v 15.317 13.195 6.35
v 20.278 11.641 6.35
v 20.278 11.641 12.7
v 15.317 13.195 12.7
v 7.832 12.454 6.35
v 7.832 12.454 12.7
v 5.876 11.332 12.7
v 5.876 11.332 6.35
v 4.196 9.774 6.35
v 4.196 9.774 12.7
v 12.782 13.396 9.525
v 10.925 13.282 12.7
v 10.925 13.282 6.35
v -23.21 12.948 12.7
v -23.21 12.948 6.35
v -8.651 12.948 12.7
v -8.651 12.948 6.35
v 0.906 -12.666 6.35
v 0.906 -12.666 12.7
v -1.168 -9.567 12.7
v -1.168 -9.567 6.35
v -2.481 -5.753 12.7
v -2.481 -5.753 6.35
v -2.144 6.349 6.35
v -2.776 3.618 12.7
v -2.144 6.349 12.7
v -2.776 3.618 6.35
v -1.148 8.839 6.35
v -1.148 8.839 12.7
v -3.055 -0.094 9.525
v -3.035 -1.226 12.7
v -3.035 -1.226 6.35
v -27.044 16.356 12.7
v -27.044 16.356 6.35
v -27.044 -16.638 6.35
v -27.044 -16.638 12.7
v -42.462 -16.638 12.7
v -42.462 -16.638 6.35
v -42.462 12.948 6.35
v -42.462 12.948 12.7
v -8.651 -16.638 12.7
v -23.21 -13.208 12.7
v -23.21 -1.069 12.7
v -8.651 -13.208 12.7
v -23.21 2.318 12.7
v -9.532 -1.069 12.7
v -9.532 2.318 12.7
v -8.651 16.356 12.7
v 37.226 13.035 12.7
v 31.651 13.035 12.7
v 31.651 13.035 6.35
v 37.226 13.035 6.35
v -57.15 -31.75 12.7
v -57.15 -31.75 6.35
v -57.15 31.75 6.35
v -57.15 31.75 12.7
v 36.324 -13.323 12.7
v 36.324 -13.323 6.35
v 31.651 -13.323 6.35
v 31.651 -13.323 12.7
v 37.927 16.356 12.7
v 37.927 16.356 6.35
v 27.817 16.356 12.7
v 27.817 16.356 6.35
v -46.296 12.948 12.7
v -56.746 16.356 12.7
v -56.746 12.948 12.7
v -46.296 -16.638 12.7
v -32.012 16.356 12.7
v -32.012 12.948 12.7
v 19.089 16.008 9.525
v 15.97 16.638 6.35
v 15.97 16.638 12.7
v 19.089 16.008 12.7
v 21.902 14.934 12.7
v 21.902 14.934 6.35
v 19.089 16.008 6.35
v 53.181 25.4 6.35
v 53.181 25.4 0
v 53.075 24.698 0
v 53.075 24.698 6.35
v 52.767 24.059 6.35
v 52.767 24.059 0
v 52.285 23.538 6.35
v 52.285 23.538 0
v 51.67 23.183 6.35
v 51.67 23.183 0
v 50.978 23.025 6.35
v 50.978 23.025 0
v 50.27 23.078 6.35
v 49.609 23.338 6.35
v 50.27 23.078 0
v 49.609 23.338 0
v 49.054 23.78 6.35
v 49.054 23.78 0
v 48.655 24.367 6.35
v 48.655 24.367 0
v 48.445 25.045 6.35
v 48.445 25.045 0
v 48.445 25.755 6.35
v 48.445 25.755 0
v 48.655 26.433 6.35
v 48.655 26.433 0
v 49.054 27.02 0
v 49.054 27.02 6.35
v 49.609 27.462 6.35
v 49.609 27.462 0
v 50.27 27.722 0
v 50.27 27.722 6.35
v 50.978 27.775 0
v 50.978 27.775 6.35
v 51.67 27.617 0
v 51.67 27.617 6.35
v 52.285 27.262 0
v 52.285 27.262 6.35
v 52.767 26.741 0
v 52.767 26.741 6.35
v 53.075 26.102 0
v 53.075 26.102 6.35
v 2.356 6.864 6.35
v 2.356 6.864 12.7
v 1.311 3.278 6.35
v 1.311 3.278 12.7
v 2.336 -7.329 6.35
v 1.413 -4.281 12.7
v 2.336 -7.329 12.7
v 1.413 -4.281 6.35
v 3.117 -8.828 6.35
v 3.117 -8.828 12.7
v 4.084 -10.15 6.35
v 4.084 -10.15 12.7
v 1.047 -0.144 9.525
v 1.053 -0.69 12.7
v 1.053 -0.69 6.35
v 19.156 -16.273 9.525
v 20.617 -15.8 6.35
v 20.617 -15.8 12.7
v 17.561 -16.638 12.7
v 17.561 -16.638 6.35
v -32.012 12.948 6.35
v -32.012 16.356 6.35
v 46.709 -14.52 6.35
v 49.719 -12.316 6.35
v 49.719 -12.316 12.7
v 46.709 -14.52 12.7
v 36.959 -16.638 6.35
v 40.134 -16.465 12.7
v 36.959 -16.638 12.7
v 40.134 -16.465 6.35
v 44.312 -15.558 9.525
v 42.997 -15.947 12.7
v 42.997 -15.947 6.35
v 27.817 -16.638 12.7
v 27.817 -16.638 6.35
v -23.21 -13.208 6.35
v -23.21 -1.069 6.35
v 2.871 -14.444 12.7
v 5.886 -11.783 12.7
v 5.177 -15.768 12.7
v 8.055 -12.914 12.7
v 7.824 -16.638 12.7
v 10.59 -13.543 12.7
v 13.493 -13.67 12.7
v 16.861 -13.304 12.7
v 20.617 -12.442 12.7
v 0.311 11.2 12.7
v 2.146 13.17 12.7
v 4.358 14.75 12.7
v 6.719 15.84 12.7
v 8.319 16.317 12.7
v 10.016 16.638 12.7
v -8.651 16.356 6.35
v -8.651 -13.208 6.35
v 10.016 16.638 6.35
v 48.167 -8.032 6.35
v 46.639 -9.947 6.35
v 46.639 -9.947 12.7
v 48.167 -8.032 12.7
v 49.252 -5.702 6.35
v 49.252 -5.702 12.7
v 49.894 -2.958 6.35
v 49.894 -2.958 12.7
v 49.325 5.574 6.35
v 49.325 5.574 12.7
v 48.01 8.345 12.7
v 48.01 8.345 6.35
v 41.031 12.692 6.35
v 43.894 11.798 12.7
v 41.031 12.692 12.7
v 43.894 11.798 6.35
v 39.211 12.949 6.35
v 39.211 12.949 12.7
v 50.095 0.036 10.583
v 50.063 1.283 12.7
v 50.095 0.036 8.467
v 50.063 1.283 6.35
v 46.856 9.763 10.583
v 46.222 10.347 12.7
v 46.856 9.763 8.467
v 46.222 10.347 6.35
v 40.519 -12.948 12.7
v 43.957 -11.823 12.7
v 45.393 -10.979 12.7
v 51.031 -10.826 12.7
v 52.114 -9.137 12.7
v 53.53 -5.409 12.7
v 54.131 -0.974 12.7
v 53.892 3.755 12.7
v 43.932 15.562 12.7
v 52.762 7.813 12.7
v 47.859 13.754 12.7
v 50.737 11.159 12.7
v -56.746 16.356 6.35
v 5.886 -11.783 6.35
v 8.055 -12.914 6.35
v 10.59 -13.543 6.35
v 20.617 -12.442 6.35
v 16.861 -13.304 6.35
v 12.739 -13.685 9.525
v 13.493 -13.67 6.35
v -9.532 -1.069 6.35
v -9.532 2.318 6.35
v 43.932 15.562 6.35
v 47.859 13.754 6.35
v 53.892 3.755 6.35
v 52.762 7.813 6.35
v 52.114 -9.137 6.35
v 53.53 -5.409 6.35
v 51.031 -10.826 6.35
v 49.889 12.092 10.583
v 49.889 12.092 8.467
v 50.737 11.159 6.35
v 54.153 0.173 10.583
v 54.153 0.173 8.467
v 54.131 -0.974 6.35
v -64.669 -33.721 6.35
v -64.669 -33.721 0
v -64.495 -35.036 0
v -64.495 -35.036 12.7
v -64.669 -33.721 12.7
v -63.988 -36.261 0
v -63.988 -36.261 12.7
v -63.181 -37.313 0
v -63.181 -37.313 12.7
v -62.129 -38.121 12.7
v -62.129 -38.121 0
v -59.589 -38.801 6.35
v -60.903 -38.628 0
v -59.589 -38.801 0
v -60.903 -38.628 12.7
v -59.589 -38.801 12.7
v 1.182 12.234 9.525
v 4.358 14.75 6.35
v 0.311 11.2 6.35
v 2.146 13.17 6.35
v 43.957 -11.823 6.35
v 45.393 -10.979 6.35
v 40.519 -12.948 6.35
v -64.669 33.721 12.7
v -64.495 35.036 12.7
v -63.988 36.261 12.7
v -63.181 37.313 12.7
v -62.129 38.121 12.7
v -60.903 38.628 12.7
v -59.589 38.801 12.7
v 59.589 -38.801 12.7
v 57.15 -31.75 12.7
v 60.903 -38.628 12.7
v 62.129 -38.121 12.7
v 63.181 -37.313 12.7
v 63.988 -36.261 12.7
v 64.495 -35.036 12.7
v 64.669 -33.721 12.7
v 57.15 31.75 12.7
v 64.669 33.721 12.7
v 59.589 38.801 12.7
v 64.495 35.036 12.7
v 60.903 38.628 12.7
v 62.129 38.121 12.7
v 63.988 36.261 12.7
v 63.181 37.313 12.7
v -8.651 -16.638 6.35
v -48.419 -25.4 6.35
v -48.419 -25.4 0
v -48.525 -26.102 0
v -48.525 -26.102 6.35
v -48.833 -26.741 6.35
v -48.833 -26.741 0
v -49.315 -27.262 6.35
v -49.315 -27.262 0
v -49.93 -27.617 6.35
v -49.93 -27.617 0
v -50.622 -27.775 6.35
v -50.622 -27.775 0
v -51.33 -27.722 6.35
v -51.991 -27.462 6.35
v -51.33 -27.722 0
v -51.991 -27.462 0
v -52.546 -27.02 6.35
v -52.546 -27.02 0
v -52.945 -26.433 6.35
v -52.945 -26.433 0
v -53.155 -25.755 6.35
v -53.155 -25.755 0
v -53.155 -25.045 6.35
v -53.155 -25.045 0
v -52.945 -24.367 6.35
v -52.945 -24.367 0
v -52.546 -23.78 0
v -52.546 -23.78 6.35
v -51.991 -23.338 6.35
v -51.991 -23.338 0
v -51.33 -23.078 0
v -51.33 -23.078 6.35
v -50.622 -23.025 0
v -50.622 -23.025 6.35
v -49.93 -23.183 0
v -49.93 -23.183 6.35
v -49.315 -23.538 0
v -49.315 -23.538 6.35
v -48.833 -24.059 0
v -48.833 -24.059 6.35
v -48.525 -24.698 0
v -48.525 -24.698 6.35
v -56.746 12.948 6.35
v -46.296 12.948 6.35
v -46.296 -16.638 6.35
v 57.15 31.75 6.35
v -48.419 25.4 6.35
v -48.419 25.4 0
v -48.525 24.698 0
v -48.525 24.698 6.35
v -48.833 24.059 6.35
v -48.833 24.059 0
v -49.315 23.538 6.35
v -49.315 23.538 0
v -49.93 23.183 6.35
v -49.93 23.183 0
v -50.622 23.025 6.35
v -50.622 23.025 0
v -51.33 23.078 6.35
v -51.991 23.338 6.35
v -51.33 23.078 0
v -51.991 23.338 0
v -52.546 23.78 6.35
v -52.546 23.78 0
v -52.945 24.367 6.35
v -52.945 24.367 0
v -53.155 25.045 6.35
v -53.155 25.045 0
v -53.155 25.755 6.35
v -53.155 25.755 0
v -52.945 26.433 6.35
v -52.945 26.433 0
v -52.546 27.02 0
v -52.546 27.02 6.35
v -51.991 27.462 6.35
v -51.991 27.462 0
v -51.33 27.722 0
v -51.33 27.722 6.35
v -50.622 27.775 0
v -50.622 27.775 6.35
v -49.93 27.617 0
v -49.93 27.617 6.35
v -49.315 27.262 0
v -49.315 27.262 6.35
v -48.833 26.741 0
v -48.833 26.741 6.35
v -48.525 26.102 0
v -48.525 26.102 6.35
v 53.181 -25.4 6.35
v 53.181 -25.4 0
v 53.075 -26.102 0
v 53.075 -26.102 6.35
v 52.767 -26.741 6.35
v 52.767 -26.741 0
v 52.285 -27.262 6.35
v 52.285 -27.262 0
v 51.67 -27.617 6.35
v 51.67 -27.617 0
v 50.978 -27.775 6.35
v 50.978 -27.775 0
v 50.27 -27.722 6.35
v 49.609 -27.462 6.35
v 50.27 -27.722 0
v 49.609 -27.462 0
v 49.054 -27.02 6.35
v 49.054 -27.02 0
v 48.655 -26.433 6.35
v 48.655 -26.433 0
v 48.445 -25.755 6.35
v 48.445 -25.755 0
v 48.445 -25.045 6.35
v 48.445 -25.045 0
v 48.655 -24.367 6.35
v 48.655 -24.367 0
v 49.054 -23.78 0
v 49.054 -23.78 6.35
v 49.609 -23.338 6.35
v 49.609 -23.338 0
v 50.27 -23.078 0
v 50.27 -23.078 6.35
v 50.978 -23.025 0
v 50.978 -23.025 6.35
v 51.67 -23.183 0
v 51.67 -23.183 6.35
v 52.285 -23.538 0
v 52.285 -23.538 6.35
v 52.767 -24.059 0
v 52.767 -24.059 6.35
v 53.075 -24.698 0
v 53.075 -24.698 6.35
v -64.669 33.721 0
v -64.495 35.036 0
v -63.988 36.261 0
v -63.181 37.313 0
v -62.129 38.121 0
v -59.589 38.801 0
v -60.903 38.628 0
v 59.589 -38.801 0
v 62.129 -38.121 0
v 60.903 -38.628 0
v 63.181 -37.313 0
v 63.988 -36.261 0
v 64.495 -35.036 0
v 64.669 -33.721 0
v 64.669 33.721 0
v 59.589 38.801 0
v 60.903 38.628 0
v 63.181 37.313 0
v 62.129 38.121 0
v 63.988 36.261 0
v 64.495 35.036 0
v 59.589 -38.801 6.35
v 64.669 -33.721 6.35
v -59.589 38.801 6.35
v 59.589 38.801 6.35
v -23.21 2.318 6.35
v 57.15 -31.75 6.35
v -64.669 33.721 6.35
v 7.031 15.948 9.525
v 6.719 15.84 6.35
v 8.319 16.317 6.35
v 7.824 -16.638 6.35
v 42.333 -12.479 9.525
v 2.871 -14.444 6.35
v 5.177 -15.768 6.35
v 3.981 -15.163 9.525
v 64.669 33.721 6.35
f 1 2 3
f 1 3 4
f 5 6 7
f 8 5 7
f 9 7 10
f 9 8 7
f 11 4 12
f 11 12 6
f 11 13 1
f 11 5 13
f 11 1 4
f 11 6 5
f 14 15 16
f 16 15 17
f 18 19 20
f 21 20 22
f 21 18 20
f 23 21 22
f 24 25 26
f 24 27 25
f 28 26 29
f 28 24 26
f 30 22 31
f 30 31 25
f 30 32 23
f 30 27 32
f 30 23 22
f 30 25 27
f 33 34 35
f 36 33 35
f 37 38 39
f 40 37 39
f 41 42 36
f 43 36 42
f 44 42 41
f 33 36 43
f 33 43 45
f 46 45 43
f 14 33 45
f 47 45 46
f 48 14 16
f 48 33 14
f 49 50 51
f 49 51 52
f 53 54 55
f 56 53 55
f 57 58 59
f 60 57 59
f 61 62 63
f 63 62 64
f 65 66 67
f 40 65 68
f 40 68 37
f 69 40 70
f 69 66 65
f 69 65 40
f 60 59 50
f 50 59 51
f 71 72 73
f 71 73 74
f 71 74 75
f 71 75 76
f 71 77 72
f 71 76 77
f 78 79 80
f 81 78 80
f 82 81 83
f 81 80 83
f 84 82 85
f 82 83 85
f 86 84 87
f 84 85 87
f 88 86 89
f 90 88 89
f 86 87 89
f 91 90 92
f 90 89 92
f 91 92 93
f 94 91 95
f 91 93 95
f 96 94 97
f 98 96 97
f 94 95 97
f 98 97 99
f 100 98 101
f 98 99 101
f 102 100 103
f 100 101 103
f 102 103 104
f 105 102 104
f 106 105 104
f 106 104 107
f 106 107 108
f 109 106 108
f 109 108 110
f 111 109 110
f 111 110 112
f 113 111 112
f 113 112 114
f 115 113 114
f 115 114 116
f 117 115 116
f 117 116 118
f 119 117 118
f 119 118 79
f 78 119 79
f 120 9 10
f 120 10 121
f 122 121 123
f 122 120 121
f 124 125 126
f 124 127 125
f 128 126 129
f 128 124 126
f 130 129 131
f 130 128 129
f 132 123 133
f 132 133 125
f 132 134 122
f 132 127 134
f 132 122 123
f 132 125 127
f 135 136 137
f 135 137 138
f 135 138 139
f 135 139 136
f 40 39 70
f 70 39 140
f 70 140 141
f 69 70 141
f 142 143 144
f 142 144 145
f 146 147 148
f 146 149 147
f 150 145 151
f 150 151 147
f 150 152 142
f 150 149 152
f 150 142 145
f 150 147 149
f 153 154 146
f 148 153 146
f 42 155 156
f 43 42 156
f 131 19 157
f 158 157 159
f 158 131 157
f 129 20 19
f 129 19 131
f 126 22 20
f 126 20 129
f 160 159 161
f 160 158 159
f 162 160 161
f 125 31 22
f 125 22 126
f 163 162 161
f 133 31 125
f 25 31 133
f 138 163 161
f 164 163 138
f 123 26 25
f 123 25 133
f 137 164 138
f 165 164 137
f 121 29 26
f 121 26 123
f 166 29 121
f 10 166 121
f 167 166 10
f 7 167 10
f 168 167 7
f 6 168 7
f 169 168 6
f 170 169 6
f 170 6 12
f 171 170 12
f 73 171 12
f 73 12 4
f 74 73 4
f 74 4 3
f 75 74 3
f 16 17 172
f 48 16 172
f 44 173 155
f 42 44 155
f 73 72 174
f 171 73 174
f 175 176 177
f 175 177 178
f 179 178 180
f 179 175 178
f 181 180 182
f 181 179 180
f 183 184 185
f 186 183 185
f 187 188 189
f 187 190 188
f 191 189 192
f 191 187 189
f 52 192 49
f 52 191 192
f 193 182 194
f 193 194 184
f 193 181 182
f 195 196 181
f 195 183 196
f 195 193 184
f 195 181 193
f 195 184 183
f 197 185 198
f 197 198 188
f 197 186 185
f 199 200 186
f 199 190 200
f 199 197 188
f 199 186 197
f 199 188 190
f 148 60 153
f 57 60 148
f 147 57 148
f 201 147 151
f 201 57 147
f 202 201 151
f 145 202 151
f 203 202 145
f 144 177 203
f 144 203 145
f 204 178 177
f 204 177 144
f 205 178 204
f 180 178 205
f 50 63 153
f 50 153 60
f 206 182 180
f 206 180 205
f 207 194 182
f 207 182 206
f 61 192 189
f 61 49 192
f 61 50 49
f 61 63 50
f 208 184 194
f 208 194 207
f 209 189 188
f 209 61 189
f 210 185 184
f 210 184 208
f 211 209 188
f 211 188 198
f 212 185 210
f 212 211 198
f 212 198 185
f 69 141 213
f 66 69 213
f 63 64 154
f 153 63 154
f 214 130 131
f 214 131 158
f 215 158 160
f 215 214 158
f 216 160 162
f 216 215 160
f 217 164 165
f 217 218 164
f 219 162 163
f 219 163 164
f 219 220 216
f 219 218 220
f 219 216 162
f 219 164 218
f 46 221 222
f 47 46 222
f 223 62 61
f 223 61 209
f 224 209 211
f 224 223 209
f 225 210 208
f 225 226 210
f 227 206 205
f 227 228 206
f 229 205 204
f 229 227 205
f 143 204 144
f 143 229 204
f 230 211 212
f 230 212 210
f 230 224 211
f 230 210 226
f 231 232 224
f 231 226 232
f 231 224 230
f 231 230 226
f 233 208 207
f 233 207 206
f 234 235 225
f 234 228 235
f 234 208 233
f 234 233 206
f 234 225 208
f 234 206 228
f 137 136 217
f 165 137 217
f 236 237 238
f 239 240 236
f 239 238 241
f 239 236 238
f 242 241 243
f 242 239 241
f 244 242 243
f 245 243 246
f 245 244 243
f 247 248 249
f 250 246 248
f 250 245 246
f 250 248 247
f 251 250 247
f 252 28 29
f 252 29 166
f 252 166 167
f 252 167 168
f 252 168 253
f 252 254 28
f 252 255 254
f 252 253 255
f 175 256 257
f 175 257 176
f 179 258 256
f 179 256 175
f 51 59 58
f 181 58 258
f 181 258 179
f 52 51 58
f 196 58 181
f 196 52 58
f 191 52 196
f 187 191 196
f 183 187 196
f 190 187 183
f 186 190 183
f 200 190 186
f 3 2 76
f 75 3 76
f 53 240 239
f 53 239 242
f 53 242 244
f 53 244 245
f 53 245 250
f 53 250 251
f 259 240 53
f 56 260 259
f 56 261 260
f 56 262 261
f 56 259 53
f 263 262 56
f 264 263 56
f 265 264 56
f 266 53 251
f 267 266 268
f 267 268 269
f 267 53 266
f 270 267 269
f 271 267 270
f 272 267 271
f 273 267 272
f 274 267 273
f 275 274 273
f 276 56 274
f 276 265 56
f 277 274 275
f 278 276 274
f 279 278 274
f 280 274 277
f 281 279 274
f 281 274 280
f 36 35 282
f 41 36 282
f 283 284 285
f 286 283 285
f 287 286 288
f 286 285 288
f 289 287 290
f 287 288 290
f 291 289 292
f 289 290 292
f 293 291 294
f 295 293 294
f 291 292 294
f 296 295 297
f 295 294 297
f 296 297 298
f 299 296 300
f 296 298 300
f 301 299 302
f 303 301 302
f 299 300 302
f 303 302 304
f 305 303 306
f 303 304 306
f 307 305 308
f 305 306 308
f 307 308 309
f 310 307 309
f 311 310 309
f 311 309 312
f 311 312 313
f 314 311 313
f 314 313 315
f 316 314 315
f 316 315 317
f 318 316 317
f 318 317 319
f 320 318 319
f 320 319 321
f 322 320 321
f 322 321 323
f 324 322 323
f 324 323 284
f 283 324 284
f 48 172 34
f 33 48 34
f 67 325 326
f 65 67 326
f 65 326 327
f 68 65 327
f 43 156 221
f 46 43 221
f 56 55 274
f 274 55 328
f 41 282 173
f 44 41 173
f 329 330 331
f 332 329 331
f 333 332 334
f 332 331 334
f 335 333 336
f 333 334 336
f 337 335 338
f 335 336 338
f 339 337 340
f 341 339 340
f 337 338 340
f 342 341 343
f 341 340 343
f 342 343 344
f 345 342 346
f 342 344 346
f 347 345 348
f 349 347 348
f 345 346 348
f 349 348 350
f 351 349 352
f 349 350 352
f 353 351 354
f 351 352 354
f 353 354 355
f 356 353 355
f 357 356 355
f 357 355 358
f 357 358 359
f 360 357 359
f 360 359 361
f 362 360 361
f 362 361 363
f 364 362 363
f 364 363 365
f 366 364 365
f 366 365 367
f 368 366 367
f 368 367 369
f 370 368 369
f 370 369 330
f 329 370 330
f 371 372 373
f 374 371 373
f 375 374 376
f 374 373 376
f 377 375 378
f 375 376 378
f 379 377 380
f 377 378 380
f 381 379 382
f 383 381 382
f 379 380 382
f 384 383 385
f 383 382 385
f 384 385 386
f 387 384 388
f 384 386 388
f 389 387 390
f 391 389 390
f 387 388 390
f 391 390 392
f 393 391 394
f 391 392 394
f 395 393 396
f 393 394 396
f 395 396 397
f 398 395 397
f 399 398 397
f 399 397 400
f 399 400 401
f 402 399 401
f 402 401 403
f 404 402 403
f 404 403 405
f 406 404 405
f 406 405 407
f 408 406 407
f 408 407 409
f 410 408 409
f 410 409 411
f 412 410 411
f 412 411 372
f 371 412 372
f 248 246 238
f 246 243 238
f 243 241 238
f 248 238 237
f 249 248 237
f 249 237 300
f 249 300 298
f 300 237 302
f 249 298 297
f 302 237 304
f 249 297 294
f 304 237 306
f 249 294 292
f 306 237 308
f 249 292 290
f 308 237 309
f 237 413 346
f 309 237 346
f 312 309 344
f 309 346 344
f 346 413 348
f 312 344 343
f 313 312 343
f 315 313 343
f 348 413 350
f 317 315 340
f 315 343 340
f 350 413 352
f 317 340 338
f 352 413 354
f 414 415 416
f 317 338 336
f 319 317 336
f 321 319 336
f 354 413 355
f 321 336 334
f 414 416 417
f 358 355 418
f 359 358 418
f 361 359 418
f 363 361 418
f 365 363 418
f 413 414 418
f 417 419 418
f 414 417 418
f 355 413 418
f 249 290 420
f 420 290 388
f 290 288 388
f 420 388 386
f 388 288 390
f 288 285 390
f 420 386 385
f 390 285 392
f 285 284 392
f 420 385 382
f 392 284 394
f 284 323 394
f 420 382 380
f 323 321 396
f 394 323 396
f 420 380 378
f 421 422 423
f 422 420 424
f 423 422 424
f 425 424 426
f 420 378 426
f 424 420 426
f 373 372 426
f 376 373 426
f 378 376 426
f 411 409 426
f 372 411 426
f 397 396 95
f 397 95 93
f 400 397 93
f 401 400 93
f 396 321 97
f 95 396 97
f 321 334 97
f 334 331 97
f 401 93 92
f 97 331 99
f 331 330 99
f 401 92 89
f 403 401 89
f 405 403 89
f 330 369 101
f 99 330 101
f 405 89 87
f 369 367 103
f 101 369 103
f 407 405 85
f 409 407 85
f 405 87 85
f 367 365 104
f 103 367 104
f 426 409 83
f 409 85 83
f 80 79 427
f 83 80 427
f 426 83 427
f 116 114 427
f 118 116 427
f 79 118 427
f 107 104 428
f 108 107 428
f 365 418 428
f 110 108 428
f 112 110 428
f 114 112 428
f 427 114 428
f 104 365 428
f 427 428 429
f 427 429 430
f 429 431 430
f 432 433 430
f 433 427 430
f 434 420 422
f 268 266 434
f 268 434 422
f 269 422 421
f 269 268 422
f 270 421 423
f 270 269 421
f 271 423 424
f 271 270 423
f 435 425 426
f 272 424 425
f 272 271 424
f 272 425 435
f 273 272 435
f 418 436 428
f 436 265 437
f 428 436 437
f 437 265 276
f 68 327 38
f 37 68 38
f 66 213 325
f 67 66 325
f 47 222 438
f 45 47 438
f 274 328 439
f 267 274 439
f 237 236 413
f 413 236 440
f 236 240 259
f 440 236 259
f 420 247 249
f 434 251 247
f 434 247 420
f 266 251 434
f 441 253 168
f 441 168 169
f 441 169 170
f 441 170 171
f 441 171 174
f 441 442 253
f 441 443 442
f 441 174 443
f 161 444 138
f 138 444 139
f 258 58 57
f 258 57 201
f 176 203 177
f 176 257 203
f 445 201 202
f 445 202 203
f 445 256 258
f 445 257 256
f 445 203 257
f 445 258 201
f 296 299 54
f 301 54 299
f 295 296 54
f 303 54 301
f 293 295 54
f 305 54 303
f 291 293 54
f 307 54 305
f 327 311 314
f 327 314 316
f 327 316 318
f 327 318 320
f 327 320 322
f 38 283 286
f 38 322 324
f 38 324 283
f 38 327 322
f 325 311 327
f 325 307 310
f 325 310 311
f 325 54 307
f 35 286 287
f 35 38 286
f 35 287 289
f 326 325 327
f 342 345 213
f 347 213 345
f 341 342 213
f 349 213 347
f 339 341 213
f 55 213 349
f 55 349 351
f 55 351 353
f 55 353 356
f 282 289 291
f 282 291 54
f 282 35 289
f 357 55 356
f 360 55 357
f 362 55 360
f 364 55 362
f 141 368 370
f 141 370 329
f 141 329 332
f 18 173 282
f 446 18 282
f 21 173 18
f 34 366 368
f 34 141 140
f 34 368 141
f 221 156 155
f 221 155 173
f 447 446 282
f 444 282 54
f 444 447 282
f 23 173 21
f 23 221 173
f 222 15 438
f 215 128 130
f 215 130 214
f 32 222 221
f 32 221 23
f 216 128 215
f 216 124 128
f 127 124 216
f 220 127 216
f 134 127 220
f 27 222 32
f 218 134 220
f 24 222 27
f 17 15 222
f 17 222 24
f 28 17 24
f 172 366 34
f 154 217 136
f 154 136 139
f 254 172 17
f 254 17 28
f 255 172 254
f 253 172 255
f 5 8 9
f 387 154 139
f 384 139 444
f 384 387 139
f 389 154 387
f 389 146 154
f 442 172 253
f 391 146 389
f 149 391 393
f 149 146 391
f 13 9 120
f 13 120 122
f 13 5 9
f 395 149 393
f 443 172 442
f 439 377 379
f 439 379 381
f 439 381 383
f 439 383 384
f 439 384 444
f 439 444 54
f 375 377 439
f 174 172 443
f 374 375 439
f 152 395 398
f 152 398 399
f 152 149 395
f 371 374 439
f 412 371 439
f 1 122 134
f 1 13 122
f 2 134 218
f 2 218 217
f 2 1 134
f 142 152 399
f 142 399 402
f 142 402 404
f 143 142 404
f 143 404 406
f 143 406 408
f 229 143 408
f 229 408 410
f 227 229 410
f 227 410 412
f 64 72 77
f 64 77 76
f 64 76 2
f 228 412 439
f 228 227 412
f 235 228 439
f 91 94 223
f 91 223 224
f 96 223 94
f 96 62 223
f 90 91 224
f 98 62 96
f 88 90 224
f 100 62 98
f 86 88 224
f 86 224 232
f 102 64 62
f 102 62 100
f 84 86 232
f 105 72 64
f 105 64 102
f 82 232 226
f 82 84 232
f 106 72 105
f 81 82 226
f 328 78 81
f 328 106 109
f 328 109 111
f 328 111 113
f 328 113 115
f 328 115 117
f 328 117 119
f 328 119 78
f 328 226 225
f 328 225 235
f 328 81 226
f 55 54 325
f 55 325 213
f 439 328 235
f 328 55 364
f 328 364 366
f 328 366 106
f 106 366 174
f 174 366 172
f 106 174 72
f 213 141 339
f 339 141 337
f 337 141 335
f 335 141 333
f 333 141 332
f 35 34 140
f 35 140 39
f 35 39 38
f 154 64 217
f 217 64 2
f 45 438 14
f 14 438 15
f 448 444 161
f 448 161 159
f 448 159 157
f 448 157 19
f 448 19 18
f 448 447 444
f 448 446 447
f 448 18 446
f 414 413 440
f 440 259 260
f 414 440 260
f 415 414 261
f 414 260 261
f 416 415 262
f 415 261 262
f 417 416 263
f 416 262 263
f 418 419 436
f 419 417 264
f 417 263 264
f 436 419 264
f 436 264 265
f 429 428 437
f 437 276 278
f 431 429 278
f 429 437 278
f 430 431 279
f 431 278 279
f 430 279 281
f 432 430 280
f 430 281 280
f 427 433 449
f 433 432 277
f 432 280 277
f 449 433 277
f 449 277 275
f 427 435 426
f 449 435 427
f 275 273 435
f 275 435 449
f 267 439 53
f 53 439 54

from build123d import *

# Parameters (mm, degrees)
F0_W         = 127
F0_H         = 76.2
F1_DEPTH     = 6.35
F2_R         = 5.08
F4_W         = 129.3370249418
F4_H         = 77.6022149651
F5_DEPTH     = 6.35
F6_R         = 5.08
F7_DEPTH     = 6.35
F8_R         = 2.38125
F9_DEPTH     = 25.4
F10_DEPTH    = 6.35
F11_T1_DEPTH = 31.75


# Not quite as in the source:
# - a fillet or chamfer that OpenCascade refuses, or shapes differently, is made with other operations: its cross-section is extruded or revolved along the edge and cut away or added


with BuildPart() as f1:
    # F0 (on Top) → F1 (new body)
    with BuildSketch(Plane.XY):
        Rectangle(F0_W, F0_H)
    extrude(amount=F1_DEPTH)

    # F2
    f2_edges = [f1.edges().sort_by_distance(p)[0] for p in [
        (-63.5, 38.1, 3.175),
        (-63.5, -38.1, 3.175),
        (63.5, -38.1, 3.175),
        (63.5, 38.1, 3.175),
    ]]
    fillet(f2_edges, radius=F2_R)

    # F4 (on offset) → F5 (join)
    with BuildSketch(Plane.XY.offset(6.35)):
        Rectangle(F4_W, F4_H)
        Polygon((-57.15, -16.6380591357), (-57.15, 16.6380591357), (-57.15, 31.75), (57.15, 31.75), (57.15, 16.6380591357), (57.15, -16.6380591357), (57.15, -31.75), (-57.15, -31.75), align=None, mode=Mode.SUBTRACT)
    extrude(amount=F5_DEPTH)

    # F6
    f6_edges = [f1.edges().sort_by_distance(p)[0] for p in [
        (-64.668512, -38.801107, 9.525),
        (64.668512, 38.801107, 9.525),
        (64.668512, -38.801107, 9.525),
        (-64.668512, 38.801107, 9.525),
    ]]
    fillet(f6_edges, radius=F6_R)

    # F4 (on offset) → F7 (join)
    with BuildSketch(Plane.XY.offset(6.35)):
        Polygon((-46.2962661107, 12.9479340409), (-46.2962661107, -16.6380591357), (-42.4617134193, -16.6380591357), (-42.4617134193, 12.9479340409), (-32.0123768006, 12.9479340409), (-32.0123768006, 16.3564253222), (-56.7456027293, 16.3564253222), (-56.7456027293, 12.9479340409), align=None)
        Polygon((-27.0440674754, 16.3564253222), (-27.0440674754, -16.6380591357), (-8.6512130402, -16.6380591357), (-8.6512130402, -13.2079037149), (-23.2095147839, -13.2079037149), (-23.2095147839, -1.0687642153), (-9.5322213798, -1.0687642153), (-9.5322213798, 2.3180629265), (-23.2095147839, 2.3180629265), (-23.2095147839, 12.9479340409), (-8.6512130402, 12.9479340409), (-8.6512130402, 16.3564253222), align=None)
        with BuildLine():
            Line((15.9701099418, 16.6380591357), (10.0159430302, 16.6380591357))
            add(Edge.make_bspline(
                [(4.3581027293, 14.7496683093), (6.8753977724, 16.2014683592), (10.0159430302, 16.6380591357)],
                knots=[0, 0, 0, 0.6992762354, 0.6992762354, 0.6992762354], degree=2))
            add(Edge.make_bspline(
                [(-1.1481993935, 8.8389689158), (0.7582448825, 12.6735216073), (4.3581027293, 14.7496683093)],
                knots=[0, 0, 0, 1, 1, 1], degree=2))
            add(Edge.make_bspline(
                [(-3.0546436694, -0.0938779378), (-3.0546436694, 5.0044162244), (-1.1481993935, 8.8389689158)],
                knots=[0, 0, 0, 1, 1, 1], degree=2))
            add(Edge.make_bspline(
                [(0.9062831691, -12.6663002274), (-3.0546436694, -8.2395943897), (-3.0546436694, -0.0938779378)],
                knots=[0, 0, 0, 1, 1, 1], degree=2))
            add(Edge.make_bspline(
                [(7.8235797826, -16.6380591357), (3.5974055182, -15.6738809021), (0.9062831691, -12.6663002274)],
                knots=[0.3205826669, 0.3205826669, 0.3205826669, 1, 1, 1], degree=2))
            Line((7.8235797826, -16.6380591357), (17.5614415983, -16.6380591357))
            add(Edge.make_bspline(
                [(20.6170394238, -15.8003790751), (19.2218518782, -16.326144487), (17.5614415983, -16.6380591357)],
                knots=[0, 0, 0, 0.406741787, 0.406741787, 0.406741787], degree=2))
            Line((20.6170394238, -15.8003790751), (20.6170394238, -12.4424374526))
            add(Edge.make_bspline(
                [(12.7385140258, -13.6845147839), (16.1903335861, -13.6845147839), (20.6170394238, -12.4424374526)],
                knots=[0, 0, 0, 1, 1, 1], degree=2))
            add(Edge.make_bspline(
                [(4.0836902957, -10.1496493556), (7.1202805155, -13.6845147839), (12.7385140258, -13.6845147839)],
                knots=[0, 0, 0, 1, 1, 1], degree=2))
            add(Edge.make_bspline(
                [(1.0471000758, -0.1444275967), (1.0471000758, -6.6147839272), (4.0836902957, -10.1496493556)],
                knots=[0, 0, 0, 1, 1, 1], degree=2))
            add(Edge.make_bspline(
                [(4.1956216831, 9.7741376042), (1.0471000758, 6.1526156179), (1.0471000758, -0.1444275967)],
                knots=[0, 0, 0, 1, 1, 1], degree=2))
            add(Edge.make_bspline(
                [(12.7818423048, 13.3956595906), (7.3441432904, 13.3956595906), (4.1956216831, 9.7741376042)],
                knots=[0, 0, 0, 1, 1, 1], degree=2))
            add(Edge.make_bspline(
                [(20.2776345716, 11.6408642911), (16.5297384382, 13.3956595906), (12.7818423048, 13.3956595906)],
                knots=[0, 0, 0, 1, 1, 1], degree=2))
            Line((20.2776345716, 11.6408642911), (21.9024450341, 14.9338134951))
            add(Edge.make_bspline(
                [(15.9701099418, 16.6380591357), (19.2412217115, 16.2297995741), (21.9024450341, 14.9338134951)],
                knots=[0.3150184776, 0.3150184776, 0.3150184776, 1, 1, 1], degree=2))
        make_face()
        with BuildLine():
            Line((27.8167551175, -16.6380591357), (36.9590219864, -16.6380591357))
            add(Edge.make_bspline(
                [(49.7192001516, -12.3160633055), (45.285272934, -16.6380591357), (36.9590219864, -16.6380591357)],
                knots=[0, 0, 0, 1, 1, 1], degree=2))
            add(Edge.make_bspline(
                [(54.1531273692, 0.173313116), (54.1531273692, -7.9940674754), (49.7192001516, -12.3160633055)],
                knots=[0, 0, 0, 1, 1, 1], degree=2))
            add(Edge.make_bspline(
                [(49.8889025777, 12.0922005307), (54.1531273692, 7.8279757392), (54.1531273692, 0.173313116)],
                knots=[0, 0, 0, 1, 1, 1], degree=2))
            add(Edge.make_bspline(
                [(37.926686884, 16.3564253222), (45.6246777862, 16.3564253222), (49.8889025777, 12.0922005307)],
                knots=[0, 0, 0, 1, 1, 1], degree=2))
            Line((37.926686884, 16.3564253222), (27.8167551175, 16.3564253222))
            Line((27.8167551175, 16.3564253222), (27.8167551175, -16.6380591357))
        make_face()
        with BuildLine():
            add(Edge.make_bspline(
                [(50.094711903, 0.0361068992), (50.094711903, 6.4920204701), (46.8559230478, 9.7633055345)],
                knots=[0, 0, 0, 1, 1, 1], degree=2))
            add(Edge.make_bspline(
                [(46.6392816528, -9.9474507202), (50.094711903, -6.5714556482), (50.094711903, 0.0361068992)],
                knots=[0, 0, 0, 1, 1, 1], degree=2))
            add(Edge.make_bspline(
                [(36.323540561, -13.3234457923), (43.1838514026, -13.3234457923), (46.6392816528, -9.9474507202)],
                knots=[0, 0, 0, 1, 1, 1], degree=2))
            Line((36.323540561, -13.3234457923), (31.6513078089, -13.3234457923))
            Line((31.6513078089, -13.3234457923), (31.6513078089, 13.0345905989))
            Line((31.6513078089, 13.0345905989), (37.2262130402, 13.0345905989))
            add(Edge.make_bspline(
                [(46.8559230478, 9.7633055345), (43.6171341926, 13.0345905989), (37.2262130402, 13.0345905989)],
                knots=[0, 0, 0, 1, 1, 1], degree=2))
        make_face(mode=Mode.SUBTRACT)
    extrude(amount=F7_DEPTH)

    # F8 (on face) → F9 (cut)
    with BuildSketch(Plane(origin=(0, 0, 0), x_dir=(1, 0, 0), z_dir=(0, 0, -1))):
        with Locations((-50.8, 25.4)):
            Circle(F8_R)
        with Locations((-50.8, -25.4)):
            Circle(F8_R)
        with Locations((50.8, -25.4)):
            Circle(F8_R)
        with Locations((50.8, 25.4)):
            Circle(F8_R)
    extrude(amount=-F9_DEPTH, mode=Mode.SUBTRACT)

    # F4 (on offset) → F10 (join)
    with BuildSketch(Plane.XY.offset(6.35)):
        Rectangle(F4_W, F4_H)
        Polygon((-57.15, -16.6380591357), (-57.15, 16.6380591357), (-57.15, 31.75), (57.15, 31.75), (57.15, 16.6380591357), (57.15, -16.6380591357), (57.15, -31.75), (-57.15, -31.75), align=None, mode=Mode.SUBTRACT)
    extrude(amount=-F10_DEPTH)

    # F11: fillet of radius 5.08 on 4 edges, made by hand

    # F11_s2 → F11_t1 (cut)
    with BuildSketch(Plane.XY.offset(-12.7)):
        with BuildLine():
            ThreePointArc((-64.6685124709, 33.7211074825), (-63.1806149193, 37.313209931), (-59.5885124709, 38.8011074825))
            Line((-59.5885124709, 38.8011074825), (-64.6685124709, 38.8011074825))
            Line((-64.6685124709, 38.8011074825), (-64.6685124709, 33.7211074825))
        make_face()
        with BuildLine():
            ThreePointArc((-59.5885124709, -38.8011074825), (-63.1806149193, -37.313209931), (-64.6685124709, -33.7211074825))
            Line((-64.6685124709, -33.7211074825), (-64.6685124709, -38.8011074825))
            Line((-64.6685124709, -38.8011074825), (-59.5885124709, -38.8011074825))
        make_face()
        with BuildLine():
            ThreePointArc((59.5885124709, -38.8011074825), (63.1806149193, -37.313209931), (64.6685124709, -33.7211074825))
            Line((64.6685124709, -33.7211074825), (64.6685124709, -38.8011074825))
            Line((64.6685124709, -38.8011074825), (59.5885124709, -38.8011074825))
        make_face()
        with BuildLine():
            ThreePointArc((64.6685124709, 33.7211074825), (63.1806149193, 37.313209931), (59.5885124709, 38.8011074825))
            Line((59.5885124709, 38.8011074825), (64.6685124709, 38.8011074825))
            Line((64.6685124709, 38.8011074825), (64.6685124709, 33.7211074825))
        make_face()
    extrude(amount=F11_T1_DEPTH, mode=Mode.SUBTRACT)


solid = f1.part
